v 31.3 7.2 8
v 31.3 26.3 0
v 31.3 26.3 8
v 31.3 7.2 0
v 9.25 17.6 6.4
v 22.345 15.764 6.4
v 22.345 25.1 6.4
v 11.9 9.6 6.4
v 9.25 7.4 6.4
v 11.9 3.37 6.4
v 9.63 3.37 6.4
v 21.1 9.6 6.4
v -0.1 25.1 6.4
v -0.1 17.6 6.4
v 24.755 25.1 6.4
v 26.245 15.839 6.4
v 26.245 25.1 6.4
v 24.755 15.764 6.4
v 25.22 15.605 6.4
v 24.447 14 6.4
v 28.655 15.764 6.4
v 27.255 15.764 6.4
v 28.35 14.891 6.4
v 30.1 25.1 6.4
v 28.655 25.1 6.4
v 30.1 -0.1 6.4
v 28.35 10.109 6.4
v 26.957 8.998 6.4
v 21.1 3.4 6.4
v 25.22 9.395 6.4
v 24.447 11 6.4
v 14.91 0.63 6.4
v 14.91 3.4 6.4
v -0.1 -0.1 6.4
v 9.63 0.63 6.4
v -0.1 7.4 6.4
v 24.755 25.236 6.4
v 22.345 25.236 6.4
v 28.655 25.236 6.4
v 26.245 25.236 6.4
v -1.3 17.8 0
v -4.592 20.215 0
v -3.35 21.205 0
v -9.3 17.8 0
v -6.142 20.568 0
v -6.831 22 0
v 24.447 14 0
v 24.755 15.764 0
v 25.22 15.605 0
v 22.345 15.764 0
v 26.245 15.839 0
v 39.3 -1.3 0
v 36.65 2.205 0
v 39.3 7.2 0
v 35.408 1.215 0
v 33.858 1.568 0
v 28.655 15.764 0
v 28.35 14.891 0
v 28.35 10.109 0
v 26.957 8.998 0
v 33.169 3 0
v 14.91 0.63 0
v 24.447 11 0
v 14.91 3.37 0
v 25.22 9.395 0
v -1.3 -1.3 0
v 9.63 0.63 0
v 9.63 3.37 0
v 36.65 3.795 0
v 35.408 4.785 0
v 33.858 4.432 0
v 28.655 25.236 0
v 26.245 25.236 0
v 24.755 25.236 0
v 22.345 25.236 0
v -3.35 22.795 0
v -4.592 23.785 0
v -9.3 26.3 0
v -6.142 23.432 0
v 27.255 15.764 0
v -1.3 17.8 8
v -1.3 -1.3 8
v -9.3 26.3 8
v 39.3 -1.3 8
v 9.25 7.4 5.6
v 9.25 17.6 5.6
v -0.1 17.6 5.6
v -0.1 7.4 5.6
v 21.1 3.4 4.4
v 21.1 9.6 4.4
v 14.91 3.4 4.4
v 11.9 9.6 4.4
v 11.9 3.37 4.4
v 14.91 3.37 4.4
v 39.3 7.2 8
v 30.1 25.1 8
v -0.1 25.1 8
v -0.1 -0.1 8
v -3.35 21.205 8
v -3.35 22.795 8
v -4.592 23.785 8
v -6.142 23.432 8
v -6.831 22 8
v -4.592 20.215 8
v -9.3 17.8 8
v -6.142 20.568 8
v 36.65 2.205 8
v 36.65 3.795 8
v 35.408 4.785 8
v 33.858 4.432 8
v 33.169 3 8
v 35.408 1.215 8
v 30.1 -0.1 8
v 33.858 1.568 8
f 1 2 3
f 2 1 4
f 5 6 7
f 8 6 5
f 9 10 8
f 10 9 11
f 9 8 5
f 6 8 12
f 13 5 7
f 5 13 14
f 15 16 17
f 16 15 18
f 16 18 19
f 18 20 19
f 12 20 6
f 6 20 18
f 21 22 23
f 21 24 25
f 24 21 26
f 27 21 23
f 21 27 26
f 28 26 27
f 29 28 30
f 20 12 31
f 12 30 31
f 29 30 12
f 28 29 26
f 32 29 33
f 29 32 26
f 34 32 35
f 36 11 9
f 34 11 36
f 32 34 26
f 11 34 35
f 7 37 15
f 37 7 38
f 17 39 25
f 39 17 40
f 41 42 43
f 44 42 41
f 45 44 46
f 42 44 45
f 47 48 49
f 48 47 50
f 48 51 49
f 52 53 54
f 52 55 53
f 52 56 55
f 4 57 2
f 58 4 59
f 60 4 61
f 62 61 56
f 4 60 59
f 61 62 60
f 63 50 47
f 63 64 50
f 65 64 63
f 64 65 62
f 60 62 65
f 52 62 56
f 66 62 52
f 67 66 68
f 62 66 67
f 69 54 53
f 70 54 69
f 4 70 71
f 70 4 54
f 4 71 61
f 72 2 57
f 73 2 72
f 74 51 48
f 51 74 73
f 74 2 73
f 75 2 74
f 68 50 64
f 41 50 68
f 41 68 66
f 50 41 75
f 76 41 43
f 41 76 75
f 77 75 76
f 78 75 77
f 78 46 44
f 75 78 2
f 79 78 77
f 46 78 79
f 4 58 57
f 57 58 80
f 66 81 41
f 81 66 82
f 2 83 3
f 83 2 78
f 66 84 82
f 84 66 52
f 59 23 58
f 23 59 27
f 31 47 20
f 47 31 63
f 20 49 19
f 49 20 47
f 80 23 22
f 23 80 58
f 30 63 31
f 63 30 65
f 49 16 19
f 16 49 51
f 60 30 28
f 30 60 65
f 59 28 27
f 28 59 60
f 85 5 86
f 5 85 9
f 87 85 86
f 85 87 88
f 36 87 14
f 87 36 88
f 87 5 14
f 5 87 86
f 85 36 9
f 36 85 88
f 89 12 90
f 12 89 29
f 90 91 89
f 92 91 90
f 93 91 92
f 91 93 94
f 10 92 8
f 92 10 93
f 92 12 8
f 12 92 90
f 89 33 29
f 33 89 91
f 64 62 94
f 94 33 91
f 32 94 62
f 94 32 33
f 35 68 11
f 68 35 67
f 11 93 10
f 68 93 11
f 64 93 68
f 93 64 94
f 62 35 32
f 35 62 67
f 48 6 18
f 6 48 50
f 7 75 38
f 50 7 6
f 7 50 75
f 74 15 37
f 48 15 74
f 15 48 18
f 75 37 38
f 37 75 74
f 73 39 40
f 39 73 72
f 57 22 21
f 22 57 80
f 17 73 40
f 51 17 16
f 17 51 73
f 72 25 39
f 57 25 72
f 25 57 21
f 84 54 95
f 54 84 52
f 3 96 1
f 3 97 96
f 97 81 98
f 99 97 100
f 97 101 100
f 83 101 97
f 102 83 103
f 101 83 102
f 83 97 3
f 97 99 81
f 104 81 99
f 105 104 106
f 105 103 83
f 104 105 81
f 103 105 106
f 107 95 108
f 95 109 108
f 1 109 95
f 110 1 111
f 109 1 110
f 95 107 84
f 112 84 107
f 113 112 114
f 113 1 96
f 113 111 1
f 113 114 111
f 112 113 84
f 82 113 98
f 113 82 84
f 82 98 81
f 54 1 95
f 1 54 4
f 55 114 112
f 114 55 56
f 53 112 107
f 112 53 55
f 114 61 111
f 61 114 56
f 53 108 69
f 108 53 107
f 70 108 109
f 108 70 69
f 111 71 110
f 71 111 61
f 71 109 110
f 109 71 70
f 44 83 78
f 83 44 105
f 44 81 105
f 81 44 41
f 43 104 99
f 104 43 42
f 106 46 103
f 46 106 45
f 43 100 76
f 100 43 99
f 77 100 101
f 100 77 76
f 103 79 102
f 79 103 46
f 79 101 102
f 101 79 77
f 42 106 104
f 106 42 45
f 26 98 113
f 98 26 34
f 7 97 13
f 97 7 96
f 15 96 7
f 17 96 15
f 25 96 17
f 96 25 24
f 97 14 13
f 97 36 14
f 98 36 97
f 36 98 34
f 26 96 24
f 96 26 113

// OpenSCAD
// file: sink.scad
include <MCAD/polyholes.scad>;
include <MCAD/units.scad>;


usb_conn_amphenol = [10.4*mm, 9.4*mm, 3.4*mm];

sink_0_1 = [26*mm, 49*mm, 0.8*mm, 1*mm, 18*mm, 4*mm, 10*mm, 0.5*mm,
		 usb_conn_amphenol];
sink_0_2 = [26*mm, 48*mm, 0.8*mm, 1*mm, 18*mm, 4*mm, 10*mm, 1.25*mm,
		 usb_conn_amphenol];
sink_0_3 = [25*mm, 30*mm, 1.6*mm, 1*mm, 17*mm, 4*mm, 10*mm, 1.25*mm,
		 usb_conn_amphenol];

function sink_width(board) = board[0];
function sink_length(board) = board[1];
function sink_thickness(board) = board[2];
function sink_corner_radius(board) = board[3];
function sink_screw_spacing(board) = board[4];
function sink_screw_distance(board) = board[5];
function sink_connector_cutout(board) = board[6];
function sink_connector_extend(board) = board[7];
function sink_connector(board) = board[8];

/*
 * A simple representation of a PD Buddy Sink circuit board
 */
module sink(board=sink_0_3, board_color="indigo", copper_color="gold",
		connector_color="silver") {
	difference() {
		color(board_color)
			hull() {
				for (x = [sink_corner_radius(board),
						sink_length(board) - sink_corner_radius(board)]) {
					for (y = [sink_corner_radius(board),
							sink_width(board) - sink_corner_radius(board)]) {
						translate([x, y, 0])
							cylinder(r=sink_corner_radius(board),
									h=sink_thickness(board),
									$fn=($fn<3) ? 8 : ceil($fn/4)*4);
					}
				}
			}

		color(copper_color)
			for (y = [-1, 1]) {
				translate([sink_screw_distance(board),
						sink_width(board)/2 + y*sink_screw_spacing(board)/2,
						-epsilon])
					polyhole(d=3.5, h=sink_thickness(board) + 2*epsilon);
			}
	}

	color(connector_color)
		translate([-sink_connector_extend(board),
				sink_width(board)/2 - sink_connector(board)[1]/2,
				sink_thickness(board)])
		cube(sink_connector(board));
}
// main file
include <MCAD/polyholes.scad>;
include <MCAD/units.scad>;

include <sink.scad>;


/*
 * Mill-Max Series 854 cutout
 *
 * Cutout is centered on the first pin, with the other pins along the positive
 * X axis.
 */
module mill_max_854_cutout(pins, h, clearance) {
	translate([-0.025*inch - 0.115*inch/2 - clearance, -0.0435*inch - clearance, 0])
		cube([pins*.05*inch + 0.115*inch + 2*clearance, .087*inch + 2*clearance, h]);
}

/*
 * 3D-printed part of a PD Buddy programming jig
 */
module programming_jig(board=sink_0_3, layer_thickness=0.4*mm,
		extrusion_width=0.6*mm, clearance=0.1*mm) {
	/* It would be ridiculous to try to cram enough information into the board
	 * objects to properly parameterize this, so the board is only used to set
	 * which object we're making. */
	if (board == sink_0_3) {
		/* Pin dimensions */
		pwr_bottom = 0.212*inch;
		pwr_stroke = 0.090*inch;
		pwr_mid = pwr_bottom + pwr_stroke/2;
		swd_bottom = 0.212*inch;
		swd_stroke = 0.055*inch;
		swd_mid = swd_bottom + swd_stroke/2;

		/* The ideal height for the pin jig: the average of the mid-stroke
		 * heights for both types of pin */
		ideal_board_height = (pwr_mid + swd_mid)/2;

		/* The height of the pin jig, rounded to the nearest layer_thickness */
		board_height = round(ideal_board_height / layer_thickness) * layer_thickness;

		echo(ideal_board_height=ideal_board_height, board_height=board_height);
		echo(pwr_percent=100-(board_height-pwr_bottom)*100/pwr_stroke);
		echo(swd_percent=100-(board_height-swd_bottom)*100/swd_stroke);

		/* The board's ideal location */
		/*
#		translate([0, 0, ideal_board_height])
			sink(board);
			*/

		/* The board's real location */
		/*
		translate([0, 0, board_height])
			sink(board);
			*/

		/* Lip around the board */
		translate([-2*extrusion_width - clearance, -2*extrusion_width - clearance, board_height])
			cube([4*extrusion_width + 2*clearance + sink_length(board), 2*extrusion_width, sink_thickness(board)]);
		translate([-2*extrusion_width - clearance, sink_width(board) + clearance, board_height])
			cube([4*extrusion_width + 2*clearance + sink_length(board), 2*extrusion_width, sink_thickness(board)]);
		translate([-2*extrusion_width - clearance, -clearance, board_height])
			cube([2*extrusion_width, 2*clearance + sink_width(board), sink_thickness(board)]);
		translate([sink_length(board) + clearance, -clearance, board_height])
			cube([2*extrusion_width, 2*clearance + sink_width(board), sink_thickness(board)]);

		/* Box under the board
		 * Every cutout is extended by clearance in X and Y.  Since the board
		 * can shift by that much, everything on it can too. */
		difference() {
			translate([-2*extrusion_width - clearance, -2*extrusion_width - clearance, 0])
				cube([4*extrusion_width + 2*clearance + sink_length(board),
						4*extrusion_width + 2*clearance + sink_width(board),
						board_height]);

			/* Cutout for the output connector */
			hull() {
				translate([26.5*mm, 11*mm, -epsilon])
					polyhole(d=2*1.75*mm + 2*clearance, h=board_height + 2*epsilon);
				translate([26.5*mm, 14*mm, -epsilon])
					polyhole(d=2*1.75*mm + 2*clearance, h=board_height + 2*epsilon);
			}

			/* Cutout under the USB connector */
			translate([-clearance, sink_width(board)/2 - sink_connector_cutout(board)/2 - clearance, board_height - 2*layer_thickness])
				cube([2*clearance + sink_connector(board)[0] - sink_connector_extend(board), sink_connector_cutout(board) + 2*clearance, 2*layer_thickness + epsilon]);

			/* Cutout for the switch */
			switch_cutout_height = ceil((1.4*mm + layer_thickness)/layer_thickness)*layer_thickness;
			translate([12*mm - clearance, 3.5*mm - clearance, board_height - switch_cutout_height])
				cube([9*mm + 2*clearance, 6*mm + 2*clearance, switch_cutout_height + epsilon]);

			/* Cutout for the power pins */
			translate([11*mm - 0.05*inch - clearance, 2*mm - 0.05*inch - clearance, -epsilon])
				cube([0.2*inch + 2*clearance, 0.1*inch + 2*clearance, board_height + 2*epsilon]);

			/* Cutout to remove the thin piece between the switch and power
			 * pins */
			translate([12*mm - clearance, 2*mm + 0.05*inch - epsilon, board_height - switch_cutout_height])
				cube([-1*mm + 0.15*inch + 2*clearance, 1.5*mm - 0.05*inch + 2*epsilon, switch_cutout_height + epsilon]);

			/* Cutouts for the SWD pins */
			translate([23.55*mm, 17.96*mm, -epsilon])
				rotate([0, 0, 90])
				mill_max_854_cutout(pins=5, h=board_height + 2*epsilon, clearance=clearance);
			translate([27.45*mm, 17.96*mm, -epsilon])
				rotate([0, 0, 90])
				mill_max_854_cutout(pins=5, h=board_height + 2*epsilon, clearance=clearance);
		}

		/* Mounting holes */
		difference() {
			translate([sink_length(board) + clearance + 2*extrusion_width,
					-clearance - 2*extrusion_width,
					0])
				cube([8*mm, 8.5*mm, board_height + sink_thickness(board)]);

			translate([35*mm, 3*mm, -epsilon])
				polyhole(d=3.3*mm, h=board_height + sink_thickness(board) + 2*epsilon);
		}

		difference() {
			translate([-clearance - 2*extrusion_width,
					sink_width(board) + clearance + 2*extrusion_width,
					0])
				rotate([0, 0, 180])
				cube([8*mm, 8.5*mm, board_height + sink_thickness(board)]);

			translate([-5*mm, 22*mm, -epsilon])
				polyhole(d=3.3*mm, h=board_height + sink_thickness(board) + 2*epsilon);
		}

		echo(total_height=board_height + sink_thickness(board));
	}
}

programming_jig();
